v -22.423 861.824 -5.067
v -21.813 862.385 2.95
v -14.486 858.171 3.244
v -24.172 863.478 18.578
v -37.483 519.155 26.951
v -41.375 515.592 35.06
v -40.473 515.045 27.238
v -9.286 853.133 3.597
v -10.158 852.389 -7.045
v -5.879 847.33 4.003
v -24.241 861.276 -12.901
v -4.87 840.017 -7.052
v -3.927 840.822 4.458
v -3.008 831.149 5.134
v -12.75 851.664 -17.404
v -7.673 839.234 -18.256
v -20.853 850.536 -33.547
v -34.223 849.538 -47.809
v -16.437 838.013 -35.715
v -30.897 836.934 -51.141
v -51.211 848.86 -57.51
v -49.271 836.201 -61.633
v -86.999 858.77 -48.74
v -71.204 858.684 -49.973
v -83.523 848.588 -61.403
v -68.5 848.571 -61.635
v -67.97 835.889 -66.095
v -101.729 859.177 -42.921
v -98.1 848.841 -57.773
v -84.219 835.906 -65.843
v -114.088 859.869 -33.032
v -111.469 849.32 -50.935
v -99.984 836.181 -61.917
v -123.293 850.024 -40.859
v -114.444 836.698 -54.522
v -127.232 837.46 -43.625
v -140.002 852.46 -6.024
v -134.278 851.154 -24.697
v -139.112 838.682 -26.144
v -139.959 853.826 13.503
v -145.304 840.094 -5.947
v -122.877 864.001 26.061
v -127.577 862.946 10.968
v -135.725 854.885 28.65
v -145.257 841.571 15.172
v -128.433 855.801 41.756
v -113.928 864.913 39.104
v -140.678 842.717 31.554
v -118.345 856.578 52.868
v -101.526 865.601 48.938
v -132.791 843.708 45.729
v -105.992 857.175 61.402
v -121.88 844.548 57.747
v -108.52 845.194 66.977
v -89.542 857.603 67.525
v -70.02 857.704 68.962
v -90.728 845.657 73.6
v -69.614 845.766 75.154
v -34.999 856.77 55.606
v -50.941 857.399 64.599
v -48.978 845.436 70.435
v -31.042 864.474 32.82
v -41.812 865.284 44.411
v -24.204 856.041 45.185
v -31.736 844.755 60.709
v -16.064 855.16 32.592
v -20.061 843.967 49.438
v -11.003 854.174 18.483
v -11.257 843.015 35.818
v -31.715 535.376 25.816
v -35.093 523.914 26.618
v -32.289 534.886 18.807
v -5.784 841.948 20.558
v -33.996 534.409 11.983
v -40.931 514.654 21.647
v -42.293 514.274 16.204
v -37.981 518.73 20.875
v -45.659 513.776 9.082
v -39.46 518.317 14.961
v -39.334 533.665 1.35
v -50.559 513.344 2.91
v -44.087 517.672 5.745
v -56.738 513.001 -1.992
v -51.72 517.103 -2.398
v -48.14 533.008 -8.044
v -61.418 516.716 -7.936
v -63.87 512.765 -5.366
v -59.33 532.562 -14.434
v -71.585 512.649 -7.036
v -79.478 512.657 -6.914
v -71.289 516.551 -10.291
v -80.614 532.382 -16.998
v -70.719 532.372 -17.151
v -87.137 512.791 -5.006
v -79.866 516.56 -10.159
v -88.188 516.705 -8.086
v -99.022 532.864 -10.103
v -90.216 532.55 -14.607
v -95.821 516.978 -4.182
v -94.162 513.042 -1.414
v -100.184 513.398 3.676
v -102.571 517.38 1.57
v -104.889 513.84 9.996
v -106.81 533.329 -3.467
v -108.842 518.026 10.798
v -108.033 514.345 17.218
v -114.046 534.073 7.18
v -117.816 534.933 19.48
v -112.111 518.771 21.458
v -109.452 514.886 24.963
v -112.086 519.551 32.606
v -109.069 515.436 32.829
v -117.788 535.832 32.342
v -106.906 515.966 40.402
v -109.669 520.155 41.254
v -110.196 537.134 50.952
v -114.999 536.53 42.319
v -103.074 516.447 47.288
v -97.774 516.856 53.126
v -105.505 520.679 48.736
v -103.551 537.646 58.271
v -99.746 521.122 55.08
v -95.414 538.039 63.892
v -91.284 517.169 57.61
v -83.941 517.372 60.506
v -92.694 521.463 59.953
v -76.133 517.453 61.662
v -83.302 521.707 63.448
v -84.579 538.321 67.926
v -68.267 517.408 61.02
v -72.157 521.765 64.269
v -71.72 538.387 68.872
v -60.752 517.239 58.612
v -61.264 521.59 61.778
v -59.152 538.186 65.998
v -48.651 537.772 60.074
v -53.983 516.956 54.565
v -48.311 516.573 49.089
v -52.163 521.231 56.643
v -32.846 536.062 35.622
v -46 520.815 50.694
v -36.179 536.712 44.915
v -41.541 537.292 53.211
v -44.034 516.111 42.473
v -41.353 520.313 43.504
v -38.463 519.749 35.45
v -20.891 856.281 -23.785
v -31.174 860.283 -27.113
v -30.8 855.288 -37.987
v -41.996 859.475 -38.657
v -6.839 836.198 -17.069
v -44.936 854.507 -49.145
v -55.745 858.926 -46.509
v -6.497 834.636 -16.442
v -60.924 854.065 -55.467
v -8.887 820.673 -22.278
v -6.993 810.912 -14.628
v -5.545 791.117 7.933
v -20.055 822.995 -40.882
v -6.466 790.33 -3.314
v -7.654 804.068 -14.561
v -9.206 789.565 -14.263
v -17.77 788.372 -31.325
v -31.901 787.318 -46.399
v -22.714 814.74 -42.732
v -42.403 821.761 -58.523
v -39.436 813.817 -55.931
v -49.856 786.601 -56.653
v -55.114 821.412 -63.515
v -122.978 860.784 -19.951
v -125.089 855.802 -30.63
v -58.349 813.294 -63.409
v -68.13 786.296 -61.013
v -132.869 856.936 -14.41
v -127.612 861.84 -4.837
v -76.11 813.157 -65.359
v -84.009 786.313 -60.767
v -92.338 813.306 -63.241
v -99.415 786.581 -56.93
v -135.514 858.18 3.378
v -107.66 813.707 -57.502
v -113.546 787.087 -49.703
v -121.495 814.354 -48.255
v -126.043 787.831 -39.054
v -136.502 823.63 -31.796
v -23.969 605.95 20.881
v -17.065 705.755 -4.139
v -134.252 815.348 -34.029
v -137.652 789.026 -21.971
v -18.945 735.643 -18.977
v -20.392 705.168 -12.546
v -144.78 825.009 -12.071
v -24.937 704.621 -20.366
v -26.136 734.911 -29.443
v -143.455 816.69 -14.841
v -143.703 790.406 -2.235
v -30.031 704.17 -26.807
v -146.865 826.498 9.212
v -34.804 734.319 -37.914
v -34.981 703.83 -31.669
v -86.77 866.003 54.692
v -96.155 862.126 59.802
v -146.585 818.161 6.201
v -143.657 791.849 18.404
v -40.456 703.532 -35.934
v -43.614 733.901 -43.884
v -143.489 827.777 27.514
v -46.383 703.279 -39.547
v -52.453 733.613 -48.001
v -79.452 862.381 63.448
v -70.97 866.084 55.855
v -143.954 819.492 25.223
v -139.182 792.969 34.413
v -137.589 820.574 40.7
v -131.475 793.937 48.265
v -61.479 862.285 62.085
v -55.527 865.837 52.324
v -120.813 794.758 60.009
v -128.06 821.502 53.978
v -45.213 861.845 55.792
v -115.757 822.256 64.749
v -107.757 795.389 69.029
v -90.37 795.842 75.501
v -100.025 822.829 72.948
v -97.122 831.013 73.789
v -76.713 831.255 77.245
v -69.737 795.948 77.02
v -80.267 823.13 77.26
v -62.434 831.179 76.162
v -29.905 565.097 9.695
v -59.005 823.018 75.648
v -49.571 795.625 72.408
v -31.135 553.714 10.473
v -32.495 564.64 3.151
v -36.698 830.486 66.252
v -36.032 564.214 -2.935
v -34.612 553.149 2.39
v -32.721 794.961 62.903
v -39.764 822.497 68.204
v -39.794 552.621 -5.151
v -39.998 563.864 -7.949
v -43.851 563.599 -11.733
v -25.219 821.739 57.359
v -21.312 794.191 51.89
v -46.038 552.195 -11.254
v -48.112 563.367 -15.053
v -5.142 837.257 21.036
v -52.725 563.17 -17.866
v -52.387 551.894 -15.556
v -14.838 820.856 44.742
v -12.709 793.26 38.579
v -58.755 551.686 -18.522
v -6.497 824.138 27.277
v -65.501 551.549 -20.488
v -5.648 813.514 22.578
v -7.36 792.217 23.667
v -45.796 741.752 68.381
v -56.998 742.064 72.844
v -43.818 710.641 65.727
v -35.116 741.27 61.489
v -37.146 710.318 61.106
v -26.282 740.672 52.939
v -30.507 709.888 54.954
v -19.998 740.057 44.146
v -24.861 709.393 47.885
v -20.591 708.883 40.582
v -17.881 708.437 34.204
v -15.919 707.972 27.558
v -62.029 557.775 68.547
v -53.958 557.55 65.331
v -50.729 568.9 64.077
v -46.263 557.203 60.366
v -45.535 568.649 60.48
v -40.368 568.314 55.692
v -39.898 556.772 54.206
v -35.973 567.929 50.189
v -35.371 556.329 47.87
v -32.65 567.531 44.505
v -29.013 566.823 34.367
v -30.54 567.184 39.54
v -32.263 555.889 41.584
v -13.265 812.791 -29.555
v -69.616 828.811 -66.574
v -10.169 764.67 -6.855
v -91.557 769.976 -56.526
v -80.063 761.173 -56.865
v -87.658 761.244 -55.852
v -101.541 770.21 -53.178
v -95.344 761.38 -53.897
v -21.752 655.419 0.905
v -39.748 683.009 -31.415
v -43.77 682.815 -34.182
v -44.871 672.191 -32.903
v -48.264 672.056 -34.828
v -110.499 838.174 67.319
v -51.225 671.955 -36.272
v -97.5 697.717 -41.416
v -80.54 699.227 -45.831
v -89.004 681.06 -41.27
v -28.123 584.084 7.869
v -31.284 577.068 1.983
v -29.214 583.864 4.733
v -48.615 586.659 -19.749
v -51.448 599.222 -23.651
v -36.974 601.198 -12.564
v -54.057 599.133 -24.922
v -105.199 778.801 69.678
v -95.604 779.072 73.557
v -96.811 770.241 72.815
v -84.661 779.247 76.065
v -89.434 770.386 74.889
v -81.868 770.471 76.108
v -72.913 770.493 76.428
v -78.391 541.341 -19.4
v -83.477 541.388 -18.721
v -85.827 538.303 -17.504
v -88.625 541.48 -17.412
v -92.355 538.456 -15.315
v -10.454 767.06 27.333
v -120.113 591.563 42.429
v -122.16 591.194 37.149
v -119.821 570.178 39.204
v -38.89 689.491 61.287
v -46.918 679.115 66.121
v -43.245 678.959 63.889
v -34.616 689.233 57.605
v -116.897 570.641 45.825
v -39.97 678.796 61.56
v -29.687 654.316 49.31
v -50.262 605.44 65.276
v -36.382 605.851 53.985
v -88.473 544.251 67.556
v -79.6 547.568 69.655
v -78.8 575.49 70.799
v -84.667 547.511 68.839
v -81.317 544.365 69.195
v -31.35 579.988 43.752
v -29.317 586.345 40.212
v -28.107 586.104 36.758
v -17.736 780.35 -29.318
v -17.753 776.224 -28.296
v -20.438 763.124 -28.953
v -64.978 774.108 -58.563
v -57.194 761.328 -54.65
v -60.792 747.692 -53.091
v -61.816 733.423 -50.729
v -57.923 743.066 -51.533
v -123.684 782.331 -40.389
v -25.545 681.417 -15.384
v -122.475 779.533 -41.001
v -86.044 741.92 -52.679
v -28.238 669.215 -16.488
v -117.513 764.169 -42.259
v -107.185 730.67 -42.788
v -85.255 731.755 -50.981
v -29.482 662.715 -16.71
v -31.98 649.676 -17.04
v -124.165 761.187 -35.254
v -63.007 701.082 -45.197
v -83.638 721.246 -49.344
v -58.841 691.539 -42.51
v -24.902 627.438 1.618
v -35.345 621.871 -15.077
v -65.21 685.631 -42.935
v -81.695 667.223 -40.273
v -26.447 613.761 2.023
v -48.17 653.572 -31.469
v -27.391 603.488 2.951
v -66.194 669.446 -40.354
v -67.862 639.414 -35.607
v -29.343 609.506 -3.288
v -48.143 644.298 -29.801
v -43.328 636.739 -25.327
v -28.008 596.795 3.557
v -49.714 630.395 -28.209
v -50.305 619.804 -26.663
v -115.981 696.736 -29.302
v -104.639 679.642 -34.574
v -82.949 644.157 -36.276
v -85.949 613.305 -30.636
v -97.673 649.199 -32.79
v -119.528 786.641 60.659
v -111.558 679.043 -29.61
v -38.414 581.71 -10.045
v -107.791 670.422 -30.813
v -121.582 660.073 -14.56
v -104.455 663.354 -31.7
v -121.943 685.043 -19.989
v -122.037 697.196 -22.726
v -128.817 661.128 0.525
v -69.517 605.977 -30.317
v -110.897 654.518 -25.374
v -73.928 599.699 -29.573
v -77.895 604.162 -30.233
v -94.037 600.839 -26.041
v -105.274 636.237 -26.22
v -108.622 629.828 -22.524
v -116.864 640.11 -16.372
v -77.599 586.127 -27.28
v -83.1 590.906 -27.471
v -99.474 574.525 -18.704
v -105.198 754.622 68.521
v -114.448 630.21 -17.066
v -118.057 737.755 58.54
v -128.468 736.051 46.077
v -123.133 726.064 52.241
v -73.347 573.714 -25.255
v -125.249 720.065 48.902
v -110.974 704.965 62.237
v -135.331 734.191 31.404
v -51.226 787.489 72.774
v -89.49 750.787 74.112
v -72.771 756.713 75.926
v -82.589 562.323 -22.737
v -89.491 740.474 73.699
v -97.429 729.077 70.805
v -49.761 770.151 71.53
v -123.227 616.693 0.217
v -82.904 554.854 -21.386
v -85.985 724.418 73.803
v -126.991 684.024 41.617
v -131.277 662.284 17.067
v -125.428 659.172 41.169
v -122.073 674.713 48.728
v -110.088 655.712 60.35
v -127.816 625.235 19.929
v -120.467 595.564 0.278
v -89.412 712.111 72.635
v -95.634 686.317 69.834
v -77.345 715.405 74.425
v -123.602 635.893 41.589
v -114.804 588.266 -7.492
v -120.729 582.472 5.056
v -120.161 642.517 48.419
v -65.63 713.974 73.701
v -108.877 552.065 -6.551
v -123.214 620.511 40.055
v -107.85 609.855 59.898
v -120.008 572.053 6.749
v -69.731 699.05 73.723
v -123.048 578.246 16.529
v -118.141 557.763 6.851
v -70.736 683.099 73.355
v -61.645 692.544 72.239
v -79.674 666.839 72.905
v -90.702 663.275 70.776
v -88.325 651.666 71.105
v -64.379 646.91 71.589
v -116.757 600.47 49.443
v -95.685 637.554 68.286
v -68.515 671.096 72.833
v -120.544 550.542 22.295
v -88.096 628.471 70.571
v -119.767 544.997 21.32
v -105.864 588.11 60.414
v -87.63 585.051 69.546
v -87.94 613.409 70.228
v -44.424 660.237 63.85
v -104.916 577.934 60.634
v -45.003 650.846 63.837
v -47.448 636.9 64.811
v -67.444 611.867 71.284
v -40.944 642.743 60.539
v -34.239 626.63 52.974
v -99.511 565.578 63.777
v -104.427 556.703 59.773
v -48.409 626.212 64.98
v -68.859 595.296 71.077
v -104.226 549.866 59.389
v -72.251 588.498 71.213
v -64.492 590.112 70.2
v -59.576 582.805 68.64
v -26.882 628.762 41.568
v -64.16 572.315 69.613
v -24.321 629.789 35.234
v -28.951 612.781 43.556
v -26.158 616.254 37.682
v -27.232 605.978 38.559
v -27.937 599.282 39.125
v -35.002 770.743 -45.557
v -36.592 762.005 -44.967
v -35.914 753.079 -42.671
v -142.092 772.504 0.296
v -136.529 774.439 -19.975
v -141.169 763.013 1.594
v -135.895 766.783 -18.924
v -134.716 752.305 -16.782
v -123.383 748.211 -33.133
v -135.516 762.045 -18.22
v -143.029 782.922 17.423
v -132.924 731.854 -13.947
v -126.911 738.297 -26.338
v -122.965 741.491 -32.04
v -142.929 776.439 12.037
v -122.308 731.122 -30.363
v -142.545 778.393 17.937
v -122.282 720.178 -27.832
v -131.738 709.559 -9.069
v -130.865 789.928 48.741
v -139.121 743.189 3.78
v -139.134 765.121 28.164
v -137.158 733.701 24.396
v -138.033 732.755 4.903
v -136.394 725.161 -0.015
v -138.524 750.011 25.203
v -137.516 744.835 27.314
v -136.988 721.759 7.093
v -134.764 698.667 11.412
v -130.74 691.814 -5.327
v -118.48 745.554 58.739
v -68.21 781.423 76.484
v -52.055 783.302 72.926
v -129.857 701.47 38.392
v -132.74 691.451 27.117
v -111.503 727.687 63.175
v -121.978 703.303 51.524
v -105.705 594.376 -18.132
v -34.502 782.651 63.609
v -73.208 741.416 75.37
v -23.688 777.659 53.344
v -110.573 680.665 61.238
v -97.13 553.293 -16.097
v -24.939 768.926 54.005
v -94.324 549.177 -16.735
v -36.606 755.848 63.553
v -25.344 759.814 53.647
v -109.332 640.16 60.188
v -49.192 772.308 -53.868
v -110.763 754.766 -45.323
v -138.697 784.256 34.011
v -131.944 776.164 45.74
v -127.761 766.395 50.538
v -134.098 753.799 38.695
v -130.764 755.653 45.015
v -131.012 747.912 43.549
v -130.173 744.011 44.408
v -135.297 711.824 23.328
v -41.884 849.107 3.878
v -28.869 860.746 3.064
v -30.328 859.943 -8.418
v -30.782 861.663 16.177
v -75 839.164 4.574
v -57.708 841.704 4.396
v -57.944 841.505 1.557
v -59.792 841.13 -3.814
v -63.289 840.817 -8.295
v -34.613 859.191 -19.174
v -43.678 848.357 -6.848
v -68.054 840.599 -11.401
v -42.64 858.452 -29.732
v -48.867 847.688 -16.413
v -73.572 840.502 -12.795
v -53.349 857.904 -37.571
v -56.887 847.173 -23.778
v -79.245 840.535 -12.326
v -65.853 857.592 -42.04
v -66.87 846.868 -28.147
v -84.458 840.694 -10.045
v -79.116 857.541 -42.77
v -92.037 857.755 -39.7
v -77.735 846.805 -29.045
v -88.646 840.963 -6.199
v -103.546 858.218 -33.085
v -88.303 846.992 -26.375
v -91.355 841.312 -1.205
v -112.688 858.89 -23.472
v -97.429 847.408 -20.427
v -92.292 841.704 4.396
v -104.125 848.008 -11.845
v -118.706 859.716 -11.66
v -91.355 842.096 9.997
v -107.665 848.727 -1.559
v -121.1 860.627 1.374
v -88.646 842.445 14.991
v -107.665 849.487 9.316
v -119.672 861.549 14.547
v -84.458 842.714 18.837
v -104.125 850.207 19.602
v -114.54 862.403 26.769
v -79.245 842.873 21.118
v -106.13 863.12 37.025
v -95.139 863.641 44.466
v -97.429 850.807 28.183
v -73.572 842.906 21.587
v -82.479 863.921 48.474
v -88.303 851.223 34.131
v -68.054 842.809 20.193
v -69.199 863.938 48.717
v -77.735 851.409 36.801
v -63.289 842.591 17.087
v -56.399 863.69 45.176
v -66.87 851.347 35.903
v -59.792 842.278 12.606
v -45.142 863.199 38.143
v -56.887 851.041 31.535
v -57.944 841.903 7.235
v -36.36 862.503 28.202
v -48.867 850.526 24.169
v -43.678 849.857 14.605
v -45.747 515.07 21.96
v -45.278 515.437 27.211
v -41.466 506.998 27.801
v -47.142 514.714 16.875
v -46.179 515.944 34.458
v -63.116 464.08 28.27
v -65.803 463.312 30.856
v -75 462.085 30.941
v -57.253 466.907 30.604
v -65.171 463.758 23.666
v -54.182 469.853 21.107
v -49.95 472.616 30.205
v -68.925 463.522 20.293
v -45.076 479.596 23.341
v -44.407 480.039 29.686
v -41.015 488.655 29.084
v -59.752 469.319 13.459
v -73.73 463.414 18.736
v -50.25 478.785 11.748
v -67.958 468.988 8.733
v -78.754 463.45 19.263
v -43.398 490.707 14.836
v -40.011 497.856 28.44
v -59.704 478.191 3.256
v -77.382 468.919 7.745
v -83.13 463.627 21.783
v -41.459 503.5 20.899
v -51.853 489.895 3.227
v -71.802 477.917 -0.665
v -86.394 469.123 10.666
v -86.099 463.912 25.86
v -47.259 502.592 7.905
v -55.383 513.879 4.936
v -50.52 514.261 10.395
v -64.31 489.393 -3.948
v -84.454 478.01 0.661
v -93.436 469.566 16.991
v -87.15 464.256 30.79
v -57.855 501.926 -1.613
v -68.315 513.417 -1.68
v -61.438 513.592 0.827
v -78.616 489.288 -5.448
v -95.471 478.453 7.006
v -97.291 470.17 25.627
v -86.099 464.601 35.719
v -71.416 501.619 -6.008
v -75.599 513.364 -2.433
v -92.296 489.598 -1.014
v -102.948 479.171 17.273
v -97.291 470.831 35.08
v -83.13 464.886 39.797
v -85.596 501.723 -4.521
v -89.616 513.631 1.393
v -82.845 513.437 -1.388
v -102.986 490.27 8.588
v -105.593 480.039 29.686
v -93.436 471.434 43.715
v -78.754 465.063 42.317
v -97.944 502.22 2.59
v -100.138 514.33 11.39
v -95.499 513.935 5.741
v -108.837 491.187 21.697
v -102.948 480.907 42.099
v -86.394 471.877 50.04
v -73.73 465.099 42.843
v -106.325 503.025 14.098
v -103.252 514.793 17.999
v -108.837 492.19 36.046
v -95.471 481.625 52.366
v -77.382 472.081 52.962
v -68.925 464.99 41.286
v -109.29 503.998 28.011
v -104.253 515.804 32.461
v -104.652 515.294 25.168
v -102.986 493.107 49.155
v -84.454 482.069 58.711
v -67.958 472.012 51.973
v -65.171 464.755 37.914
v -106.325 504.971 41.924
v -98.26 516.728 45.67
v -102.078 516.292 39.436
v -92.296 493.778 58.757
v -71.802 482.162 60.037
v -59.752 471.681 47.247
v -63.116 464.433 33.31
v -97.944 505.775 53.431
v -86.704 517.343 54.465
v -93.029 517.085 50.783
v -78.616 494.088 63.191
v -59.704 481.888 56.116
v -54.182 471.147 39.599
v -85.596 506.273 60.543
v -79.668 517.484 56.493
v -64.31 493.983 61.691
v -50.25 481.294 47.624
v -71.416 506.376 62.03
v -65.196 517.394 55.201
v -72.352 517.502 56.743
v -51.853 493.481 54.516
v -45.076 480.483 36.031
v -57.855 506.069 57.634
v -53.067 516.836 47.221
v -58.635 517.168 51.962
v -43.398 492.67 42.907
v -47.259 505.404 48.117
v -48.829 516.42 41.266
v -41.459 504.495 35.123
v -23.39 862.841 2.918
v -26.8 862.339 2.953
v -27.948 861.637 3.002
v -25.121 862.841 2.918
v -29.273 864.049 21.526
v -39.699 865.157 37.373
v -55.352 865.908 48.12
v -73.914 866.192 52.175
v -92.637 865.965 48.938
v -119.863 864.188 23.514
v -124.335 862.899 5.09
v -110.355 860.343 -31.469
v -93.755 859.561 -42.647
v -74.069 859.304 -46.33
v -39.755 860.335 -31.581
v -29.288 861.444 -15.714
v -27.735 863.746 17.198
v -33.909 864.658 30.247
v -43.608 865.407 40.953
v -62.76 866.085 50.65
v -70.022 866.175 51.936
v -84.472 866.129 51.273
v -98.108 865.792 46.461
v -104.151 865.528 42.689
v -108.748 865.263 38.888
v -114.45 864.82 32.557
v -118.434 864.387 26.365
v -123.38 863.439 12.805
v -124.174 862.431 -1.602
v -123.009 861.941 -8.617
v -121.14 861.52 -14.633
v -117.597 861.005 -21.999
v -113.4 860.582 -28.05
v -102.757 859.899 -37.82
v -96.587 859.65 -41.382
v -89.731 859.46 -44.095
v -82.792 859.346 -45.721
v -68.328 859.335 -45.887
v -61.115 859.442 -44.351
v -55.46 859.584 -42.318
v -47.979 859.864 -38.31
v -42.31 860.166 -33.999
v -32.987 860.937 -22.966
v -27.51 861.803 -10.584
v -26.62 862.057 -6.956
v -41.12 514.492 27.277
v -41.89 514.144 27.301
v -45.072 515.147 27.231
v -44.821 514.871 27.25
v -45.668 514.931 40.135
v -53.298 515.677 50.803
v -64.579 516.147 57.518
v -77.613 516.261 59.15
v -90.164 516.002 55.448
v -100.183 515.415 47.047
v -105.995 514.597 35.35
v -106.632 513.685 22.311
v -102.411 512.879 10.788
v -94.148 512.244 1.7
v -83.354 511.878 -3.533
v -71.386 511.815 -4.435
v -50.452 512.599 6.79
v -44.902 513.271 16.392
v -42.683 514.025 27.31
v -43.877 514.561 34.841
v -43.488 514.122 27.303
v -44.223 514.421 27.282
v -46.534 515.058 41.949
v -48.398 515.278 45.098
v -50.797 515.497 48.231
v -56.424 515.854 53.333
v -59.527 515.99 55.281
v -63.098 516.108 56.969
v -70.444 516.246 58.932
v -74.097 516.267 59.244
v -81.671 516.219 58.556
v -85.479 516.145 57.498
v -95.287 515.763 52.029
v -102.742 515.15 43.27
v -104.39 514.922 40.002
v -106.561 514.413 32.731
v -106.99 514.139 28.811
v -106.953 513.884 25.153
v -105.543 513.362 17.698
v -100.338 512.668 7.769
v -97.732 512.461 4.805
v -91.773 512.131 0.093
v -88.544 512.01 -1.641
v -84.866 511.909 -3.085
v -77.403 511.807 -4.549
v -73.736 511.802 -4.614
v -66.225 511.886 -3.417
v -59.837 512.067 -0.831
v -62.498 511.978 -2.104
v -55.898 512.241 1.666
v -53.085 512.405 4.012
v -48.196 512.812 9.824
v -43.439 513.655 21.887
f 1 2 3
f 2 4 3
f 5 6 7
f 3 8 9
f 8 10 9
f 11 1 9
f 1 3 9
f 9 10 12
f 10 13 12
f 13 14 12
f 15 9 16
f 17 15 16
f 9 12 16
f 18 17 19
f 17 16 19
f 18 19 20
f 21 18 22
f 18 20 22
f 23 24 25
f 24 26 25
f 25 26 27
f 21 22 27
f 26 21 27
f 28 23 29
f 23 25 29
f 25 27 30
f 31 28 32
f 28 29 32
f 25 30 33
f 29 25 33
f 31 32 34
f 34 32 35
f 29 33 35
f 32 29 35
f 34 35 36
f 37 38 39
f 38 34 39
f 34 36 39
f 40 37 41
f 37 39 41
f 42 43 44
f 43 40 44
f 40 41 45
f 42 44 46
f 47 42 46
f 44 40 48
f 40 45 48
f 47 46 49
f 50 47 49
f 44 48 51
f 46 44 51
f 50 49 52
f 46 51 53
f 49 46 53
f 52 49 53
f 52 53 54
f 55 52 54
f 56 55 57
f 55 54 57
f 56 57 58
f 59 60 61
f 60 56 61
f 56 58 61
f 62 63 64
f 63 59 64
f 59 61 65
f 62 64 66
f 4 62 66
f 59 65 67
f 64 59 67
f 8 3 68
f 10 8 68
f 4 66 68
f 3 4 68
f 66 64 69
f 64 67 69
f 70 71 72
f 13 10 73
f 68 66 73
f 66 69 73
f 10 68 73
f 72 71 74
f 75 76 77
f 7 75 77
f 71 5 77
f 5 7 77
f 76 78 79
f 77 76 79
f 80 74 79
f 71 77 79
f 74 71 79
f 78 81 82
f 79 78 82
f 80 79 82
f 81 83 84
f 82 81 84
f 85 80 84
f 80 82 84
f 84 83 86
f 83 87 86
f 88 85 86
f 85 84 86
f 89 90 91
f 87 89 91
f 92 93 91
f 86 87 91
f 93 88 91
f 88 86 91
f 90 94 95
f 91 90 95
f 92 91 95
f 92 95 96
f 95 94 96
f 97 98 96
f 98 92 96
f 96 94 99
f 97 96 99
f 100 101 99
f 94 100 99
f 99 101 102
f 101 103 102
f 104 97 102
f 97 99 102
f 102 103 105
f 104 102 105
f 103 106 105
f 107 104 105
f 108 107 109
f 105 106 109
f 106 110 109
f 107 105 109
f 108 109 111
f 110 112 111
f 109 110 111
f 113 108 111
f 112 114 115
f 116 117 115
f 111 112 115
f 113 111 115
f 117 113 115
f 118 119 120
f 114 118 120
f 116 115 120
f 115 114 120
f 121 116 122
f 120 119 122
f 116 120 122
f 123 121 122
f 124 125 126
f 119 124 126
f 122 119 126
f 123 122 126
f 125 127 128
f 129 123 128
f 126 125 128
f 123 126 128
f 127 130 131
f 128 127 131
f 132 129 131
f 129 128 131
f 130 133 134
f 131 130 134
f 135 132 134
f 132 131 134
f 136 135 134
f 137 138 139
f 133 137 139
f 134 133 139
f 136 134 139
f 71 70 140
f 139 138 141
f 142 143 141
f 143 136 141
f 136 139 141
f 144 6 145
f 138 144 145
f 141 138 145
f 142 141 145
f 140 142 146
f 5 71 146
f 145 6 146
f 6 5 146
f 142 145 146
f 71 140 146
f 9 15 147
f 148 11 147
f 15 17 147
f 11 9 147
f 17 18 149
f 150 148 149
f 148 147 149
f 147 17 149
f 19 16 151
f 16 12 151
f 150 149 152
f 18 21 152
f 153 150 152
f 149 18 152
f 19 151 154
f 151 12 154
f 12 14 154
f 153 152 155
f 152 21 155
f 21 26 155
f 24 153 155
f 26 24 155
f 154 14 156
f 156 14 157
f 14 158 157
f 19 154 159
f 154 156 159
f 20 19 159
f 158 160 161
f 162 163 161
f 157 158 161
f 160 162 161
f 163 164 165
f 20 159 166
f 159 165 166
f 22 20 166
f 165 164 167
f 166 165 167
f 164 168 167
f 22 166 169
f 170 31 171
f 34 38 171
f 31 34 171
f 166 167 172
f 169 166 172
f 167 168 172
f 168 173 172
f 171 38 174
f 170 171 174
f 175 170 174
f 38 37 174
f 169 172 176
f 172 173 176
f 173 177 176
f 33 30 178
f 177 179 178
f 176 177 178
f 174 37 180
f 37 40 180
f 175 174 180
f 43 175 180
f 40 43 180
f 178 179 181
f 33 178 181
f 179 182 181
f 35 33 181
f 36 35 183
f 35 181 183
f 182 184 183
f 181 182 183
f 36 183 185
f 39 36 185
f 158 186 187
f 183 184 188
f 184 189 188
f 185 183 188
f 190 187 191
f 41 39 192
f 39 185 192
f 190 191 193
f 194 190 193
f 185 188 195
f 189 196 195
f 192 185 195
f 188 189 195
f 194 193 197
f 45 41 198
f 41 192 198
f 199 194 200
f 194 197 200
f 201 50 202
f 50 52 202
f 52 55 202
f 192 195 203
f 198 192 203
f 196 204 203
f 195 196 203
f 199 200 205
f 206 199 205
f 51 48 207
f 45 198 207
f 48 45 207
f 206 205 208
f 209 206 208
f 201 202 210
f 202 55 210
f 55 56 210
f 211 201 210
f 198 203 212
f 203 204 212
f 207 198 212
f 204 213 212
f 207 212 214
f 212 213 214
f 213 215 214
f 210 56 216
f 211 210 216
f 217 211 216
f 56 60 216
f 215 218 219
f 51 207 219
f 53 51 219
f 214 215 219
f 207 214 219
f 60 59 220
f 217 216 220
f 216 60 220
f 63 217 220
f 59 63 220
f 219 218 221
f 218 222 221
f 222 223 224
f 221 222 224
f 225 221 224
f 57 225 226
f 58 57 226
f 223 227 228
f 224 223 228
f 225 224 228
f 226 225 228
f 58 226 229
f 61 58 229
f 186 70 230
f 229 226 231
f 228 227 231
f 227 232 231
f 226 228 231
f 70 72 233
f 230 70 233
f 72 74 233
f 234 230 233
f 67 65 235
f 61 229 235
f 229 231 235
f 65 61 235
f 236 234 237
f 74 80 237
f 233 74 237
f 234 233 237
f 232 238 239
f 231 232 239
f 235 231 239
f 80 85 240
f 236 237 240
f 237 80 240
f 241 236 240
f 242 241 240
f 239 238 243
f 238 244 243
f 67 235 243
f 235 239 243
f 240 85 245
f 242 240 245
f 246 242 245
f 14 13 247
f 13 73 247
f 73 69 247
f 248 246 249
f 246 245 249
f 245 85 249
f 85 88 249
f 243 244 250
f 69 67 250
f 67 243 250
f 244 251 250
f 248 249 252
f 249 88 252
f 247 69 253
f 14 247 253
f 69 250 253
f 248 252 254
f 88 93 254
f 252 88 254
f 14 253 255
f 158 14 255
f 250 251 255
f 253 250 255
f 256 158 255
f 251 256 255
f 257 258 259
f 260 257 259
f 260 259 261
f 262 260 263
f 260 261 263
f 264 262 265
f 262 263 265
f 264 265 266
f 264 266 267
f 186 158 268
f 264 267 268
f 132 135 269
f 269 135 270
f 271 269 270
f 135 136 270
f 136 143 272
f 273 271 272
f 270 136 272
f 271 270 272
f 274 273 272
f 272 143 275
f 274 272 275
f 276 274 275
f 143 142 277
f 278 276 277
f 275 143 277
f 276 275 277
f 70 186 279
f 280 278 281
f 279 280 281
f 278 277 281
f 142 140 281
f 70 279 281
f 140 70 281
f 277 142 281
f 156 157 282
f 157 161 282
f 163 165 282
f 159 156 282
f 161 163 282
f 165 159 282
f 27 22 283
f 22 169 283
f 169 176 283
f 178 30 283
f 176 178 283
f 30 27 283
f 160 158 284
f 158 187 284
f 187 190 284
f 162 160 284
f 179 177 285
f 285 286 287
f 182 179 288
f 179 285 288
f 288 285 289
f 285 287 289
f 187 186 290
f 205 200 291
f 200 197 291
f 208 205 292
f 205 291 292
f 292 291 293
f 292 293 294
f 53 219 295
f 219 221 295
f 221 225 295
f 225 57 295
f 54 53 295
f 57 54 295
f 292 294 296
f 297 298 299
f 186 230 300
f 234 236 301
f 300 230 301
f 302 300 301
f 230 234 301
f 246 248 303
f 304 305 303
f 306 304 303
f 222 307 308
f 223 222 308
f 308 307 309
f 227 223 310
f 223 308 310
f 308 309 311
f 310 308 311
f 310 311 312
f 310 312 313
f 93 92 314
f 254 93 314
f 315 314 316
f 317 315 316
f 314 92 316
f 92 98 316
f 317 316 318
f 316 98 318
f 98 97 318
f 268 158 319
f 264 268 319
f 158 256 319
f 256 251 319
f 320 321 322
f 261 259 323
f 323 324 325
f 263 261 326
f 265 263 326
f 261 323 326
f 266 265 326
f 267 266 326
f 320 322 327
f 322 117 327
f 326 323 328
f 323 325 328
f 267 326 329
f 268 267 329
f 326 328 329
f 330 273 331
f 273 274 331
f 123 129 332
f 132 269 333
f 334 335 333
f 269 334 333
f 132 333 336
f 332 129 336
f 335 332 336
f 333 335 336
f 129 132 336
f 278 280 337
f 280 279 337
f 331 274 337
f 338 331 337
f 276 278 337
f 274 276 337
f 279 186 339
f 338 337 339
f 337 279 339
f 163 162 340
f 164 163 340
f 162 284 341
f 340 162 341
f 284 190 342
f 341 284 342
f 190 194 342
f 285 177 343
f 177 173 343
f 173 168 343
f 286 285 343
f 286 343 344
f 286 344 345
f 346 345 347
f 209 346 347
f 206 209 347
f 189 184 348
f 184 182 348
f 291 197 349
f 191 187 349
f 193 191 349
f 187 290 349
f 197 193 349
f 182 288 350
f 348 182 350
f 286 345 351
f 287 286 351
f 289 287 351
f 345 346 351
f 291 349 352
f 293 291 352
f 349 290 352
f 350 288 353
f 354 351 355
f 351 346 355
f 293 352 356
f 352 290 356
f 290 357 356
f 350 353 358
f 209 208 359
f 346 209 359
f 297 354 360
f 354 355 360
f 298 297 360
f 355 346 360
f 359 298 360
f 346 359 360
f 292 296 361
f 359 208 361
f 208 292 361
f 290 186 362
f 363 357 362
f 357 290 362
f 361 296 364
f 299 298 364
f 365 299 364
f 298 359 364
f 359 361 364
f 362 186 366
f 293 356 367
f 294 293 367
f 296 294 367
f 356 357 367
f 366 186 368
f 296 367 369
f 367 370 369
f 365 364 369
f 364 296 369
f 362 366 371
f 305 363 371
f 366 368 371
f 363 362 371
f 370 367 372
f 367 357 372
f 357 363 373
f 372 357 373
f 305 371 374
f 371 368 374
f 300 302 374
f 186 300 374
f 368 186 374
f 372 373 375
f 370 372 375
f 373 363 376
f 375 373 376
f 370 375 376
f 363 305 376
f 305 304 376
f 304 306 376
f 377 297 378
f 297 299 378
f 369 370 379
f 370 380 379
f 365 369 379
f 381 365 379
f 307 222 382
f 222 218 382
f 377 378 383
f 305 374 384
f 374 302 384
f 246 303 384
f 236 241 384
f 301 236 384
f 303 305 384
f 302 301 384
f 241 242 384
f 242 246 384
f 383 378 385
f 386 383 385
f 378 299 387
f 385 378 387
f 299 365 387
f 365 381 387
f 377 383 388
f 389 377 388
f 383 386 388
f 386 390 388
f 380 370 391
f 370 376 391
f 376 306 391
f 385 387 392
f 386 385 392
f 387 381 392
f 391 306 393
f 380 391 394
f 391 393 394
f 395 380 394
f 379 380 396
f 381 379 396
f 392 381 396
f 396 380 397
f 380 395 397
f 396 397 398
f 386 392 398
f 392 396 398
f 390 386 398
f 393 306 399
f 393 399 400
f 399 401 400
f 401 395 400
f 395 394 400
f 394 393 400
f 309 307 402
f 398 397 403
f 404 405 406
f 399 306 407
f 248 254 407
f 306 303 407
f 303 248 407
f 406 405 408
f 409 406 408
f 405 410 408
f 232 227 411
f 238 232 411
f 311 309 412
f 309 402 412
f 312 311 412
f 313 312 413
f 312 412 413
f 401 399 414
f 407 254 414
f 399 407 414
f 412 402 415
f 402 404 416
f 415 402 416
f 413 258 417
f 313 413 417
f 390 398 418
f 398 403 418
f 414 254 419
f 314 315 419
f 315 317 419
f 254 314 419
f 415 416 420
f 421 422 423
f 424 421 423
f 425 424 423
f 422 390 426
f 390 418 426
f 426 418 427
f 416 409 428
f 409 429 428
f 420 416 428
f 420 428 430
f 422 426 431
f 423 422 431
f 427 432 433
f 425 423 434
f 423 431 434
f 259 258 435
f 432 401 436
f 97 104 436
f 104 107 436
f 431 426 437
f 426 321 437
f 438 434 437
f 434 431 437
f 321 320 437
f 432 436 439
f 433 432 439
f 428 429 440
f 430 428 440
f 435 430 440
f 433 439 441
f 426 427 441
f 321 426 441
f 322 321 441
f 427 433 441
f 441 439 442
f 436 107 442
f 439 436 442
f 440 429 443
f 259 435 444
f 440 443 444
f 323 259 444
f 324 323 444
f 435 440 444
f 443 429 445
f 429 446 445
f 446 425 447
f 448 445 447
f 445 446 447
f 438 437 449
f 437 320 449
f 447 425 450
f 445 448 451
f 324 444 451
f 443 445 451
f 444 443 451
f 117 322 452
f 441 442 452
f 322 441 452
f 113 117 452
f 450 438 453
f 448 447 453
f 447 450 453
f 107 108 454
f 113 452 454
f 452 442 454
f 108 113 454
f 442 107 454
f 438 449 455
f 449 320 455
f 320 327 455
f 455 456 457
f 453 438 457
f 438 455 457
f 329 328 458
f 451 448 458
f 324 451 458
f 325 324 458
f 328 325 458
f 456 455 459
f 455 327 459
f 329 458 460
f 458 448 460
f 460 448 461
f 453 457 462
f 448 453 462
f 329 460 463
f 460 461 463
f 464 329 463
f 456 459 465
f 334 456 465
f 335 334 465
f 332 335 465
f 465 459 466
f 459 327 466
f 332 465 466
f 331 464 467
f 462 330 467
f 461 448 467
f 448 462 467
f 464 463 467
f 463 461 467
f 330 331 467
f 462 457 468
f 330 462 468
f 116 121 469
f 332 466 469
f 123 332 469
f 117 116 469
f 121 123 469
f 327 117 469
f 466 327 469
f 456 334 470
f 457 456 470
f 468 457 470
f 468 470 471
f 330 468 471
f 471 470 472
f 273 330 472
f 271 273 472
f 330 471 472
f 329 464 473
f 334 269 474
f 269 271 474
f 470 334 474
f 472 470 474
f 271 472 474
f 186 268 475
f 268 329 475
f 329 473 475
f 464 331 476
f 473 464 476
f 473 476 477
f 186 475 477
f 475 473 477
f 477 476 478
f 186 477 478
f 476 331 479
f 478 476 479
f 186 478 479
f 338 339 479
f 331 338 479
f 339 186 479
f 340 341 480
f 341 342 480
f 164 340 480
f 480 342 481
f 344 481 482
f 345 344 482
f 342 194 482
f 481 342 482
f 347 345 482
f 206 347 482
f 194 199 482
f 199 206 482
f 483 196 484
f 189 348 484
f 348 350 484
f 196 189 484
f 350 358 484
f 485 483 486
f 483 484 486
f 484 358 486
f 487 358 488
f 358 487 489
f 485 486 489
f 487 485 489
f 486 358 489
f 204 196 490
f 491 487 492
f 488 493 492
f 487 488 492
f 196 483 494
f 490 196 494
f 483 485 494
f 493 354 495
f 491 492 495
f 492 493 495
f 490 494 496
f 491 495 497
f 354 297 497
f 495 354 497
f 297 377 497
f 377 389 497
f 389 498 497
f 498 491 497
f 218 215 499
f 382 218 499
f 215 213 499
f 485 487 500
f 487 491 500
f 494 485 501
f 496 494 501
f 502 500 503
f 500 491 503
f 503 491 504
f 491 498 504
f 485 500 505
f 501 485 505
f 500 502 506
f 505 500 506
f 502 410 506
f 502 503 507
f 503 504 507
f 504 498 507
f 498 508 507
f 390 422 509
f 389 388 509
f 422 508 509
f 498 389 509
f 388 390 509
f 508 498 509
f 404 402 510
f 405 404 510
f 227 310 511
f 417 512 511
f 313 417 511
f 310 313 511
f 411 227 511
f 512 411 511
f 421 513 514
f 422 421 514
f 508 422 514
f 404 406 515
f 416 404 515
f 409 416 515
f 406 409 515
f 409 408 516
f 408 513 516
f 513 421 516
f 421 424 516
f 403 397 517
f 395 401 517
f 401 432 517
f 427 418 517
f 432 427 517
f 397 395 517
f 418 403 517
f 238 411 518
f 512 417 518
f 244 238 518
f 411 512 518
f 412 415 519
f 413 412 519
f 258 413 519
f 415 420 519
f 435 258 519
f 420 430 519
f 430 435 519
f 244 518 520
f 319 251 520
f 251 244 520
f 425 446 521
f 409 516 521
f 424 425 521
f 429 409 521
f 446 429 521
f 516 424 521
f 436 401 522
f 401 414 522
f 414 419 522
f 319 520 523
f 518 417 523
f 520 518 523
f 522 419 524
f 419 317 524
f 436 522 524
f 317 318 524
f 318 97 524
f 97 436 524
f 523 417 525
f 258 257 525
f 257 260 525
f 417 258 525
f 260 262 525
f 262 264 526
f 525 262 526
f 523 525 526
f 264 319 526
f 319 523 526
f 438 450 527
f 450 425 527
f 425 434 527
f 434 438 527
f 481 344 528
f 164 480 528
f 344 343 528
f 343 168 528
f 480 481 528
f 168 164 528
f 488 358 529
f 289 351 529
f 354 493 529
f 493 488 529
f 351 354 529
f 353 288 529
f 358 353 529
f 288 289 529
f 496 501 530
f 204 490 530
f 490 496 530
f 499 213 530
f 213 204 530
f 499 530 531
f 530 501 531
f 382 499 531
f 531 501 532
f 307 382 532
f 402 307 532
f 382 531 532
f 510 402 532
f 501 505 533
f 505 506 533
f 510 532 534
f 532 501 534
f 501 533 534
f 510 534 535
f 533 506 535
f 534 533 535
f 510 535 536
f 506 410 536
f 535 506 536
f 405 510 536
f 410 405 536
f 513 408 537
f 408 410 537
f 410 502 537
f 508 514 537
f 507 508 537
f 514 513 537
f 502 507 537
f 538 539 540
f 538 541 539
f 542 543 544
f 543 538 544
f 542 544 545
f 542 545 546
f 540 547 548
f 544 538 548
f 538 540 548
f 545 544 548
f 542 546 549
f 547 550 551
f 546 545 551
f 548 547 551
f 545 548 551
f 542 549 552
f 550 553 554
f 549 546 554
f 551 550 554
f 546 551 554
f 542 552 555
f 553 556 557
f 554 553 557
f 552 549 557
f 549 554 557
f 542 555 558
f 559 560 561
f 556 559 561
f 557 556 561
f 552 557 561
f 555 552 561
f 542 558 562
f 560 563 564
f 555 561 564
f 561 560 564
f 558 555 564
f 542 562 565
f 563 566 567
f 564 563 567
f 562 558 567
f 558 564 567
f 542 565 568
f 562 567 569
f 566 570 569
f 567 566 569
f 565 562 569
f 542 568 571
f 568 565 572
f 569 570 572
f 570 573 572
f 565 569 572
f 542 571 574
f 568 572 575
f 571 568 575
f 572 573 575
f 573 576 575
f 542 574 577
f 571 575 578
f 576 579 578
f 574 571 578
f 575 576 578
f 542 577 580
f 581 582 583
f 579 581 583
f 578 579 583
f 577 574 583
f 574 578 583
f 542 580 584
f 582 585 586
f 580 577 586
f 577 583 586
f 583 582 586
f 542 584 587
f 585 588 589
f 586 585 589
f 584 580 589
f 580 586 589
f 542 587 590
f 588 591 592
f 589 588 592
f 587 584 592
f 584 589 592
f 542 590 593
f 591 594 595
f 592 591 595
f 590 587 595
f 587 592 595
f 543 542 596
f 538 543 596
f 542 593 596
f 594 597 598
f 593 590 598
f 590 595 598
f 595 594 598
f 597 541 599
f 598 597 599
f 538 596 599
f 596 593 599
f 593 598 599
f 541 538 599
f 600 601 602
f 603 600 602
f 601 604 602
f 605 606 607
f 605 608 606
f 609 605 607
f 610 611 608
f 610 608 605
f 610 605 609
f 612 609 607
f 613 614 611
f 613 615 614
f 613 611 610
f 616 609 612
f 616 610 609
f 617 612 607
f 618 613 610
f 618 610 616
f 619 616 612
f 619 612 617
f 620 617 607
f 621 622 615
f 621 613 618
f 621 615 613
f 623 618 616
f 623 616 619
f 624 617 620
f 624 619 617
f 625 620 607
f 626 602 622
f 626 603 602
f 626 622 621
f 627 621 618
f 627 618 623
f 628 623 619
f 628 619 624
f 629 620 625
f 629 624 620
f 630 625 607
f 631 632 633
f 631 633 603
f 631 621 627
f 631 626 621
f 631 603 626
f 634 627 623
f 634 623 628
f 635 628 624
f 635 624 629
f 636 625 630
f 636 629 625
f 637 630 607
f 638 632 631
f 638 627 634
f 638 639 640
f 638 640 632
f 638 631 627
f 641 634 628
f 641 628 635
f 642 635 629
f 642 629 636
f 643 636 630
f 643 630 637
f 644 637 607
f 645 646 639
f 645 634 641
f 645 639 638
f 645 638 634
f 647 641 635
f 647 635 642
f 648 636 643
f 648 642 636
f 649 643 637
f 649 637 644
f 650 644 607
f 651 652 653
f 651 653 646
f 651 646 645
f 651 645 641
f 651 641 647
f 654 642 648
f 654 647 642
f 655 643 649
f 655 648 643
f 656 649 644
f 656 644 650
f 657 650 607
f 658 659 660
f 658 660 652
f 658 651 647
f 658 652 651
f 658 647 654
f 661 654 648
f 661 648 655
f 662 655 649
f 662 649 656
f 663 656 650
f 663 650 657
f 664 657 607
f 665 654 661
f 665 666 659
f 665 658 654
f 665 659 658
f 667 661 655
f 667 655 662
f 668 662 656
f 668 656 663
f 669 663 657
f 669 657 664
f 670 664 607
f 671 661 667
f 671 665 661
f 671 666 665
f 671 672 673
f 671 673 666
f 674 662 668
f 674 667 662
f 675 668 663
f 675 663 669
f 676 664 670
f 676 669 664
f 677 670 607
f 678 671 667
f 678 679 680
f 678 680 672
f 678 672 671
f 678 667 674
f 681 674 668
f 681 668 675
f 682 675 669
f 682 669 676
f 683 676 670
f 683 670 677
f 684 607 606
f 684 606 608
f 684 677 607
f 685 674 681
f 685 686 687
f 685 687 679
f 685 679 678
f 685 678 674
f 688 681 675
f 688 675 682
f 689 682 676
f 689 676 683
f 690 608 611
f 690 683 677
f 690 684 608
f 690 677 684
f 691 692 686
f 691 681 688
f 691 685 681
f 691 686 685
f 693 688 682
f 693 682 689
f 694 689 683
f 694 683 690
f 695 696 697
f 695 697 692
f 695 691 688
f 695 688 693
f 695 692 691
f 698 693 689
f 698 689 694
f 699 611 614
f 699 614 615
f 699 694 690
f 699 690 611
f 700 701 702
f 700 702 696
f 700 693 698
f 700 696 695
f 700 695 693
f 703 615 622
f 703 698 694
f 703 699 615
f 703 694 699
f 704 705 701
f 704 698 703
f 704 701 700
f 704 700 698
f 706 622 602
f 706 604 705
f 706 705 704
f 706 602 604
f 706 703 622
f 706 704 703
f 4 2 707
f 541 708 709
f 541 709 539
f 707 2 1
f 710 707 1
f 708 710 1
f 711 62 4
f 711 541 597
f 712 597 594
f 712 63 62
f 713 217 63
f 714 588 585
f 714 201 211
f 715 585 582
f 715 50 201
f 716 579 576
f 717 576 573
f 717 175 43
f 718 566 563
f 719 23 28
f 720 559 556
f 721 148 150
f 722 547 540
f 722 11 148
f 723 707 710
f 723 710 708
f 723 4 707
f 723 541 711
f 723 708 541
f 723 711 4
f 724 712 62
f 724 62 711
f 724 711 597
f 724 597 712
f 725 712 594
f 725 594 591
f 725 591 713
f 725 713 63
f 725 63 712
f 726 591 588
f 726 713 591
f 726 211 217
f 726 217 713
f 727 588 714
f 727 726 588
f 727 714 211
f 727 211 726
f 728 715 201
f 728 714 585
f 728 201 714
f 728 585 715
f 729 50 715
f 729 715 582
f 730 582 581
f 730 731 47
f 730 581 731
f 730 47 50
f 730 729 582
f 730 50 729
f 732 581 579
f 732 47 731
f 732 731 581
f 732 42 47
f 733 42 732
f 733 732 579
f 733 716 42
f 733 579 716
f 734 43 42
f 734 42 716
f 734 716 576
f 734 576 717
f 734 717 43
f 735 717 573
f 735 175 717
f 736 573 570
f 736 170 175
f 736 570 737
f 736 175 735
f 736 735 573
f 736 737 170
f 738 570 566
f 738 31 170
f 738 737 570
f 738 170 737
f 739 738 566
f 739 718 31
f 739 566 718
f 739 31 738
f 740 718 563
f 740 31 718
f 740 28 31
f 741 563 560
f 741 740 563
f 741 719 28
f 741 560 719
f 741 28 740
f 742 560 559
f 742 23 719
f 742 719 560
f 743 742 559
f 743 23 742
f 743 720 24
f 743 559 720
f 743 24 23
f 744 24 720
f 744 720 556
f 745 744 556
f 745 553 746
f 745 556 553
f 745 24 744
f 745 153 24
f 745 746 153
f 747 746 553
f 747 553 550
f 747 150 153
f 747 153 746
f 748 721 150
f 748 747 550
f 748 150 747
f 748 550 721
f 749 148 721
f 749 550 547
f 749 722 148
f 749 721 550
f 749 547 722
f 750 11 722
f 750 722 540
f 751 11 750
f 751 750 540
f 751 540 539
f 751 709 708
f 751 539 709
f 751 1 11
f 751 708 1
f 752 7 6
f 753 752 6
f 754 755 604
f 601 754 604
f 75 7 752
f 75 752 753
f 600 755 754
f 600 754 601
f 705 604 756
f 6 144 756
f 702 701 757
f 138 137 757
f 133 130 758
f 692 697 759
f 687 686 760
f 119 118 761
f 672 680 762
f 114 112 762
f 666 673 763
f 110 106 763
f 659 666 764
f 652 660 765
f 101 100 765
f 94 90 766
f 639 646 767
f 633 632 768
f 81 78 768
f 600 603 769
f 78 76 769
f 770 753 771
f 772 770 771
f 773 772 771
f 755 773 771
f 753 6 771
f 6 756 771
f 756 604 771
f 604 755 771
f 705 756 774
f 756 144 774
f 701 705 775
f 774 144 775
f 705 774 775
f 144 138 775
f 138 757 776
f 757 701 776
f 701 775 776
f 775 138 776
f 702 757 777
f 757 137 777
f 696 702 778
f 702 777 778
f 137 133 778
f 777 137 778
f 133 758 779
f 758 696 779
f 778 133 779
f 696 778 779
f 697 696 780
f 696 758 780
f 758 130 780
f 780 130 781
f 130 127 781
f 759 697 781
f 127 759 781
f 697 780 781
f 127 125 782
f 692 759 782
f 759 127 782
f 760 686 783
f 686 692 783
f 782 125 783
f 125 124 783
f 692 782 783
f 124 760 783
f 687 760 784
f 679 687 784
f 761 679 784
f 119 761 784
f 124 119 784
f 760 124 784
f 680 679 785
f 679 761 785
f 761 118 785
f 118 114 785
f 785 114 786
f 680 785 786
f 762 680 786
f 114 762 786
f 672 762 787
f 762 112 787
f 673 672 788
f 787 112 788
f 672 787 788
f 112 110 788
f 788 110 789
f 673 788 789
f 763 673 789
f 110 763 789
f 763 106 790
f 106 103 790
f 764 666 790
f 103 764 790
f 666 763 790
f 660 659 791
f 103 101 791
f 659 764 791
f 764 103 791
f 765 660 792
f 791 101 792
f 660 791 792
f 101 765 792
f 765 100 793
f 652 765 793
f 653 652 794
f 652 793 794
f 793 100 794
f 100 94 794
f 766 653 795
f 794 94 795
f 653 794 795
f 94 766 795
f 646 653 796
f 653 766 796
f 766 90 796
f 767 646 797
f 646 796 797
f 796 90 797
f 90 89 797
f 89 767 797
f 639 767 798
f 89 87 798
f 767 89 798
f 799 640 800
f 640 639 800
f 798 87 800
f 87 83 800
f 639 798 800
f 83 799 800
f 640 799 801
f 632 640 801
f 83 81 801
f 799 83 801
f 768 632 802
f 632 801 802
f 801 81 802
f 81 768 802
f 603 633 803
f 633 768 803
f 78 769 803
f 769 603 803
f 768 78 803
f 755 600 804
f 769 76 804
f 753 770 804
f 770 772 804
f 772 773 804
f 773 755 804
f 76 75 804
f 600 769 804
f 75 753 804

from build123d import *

# Parameters (mm, degrees)
FILLET075_R             = 6
FILLET076_R             = 3
BODY046_PLACEMENT_ANGLE = 4


with BuildPart() as part:
    # Sketch153 → Revolution079 (revolve)
    with BuildSketch(Plane.XY):
        with BuildLine():
            Line((0, -29.245996), (0, -395.969613))
            add(Edge.make_bspline(
                [(0, -29.245996), (71.97521, -29.245996), (74.761139, -71.14093), (60.18763, -188.319479), (45.659971, -358.12794), (39.993144, -395.969613), (0, -395.969613)],
                knots=[0, 0, 0, 0, 0.25, 0.5, 0.75, 1, 1, 1, 1], degree=3))
        make_face()
    revolve(axis=Axis((0, 0, 0), (0, 1, 0)))

    # Sketch154 → Groove073 (revolve, cut)
    with BuildSketch(Plane.XY):
        with BuildLine():
            Line((0, 60), (0, -60))
            ThreePointArc((0, -60), (60, 0), (0, 60))
        make_face()
    revolve(axis=Axis((0, 0, 0), (0, 1, 0)), mode=Mode.SUBTRACT)

    # Fillet075
    fillet075_edges = [part.edges().sort_by_distance(p)[0] for p in [
        (-48.746872, -34.982031, 0),
    ]]
    fillet(fillet075_edges, radius=FILLET075_R)

    # Sketch155 → Groove074 (revolve, cut)
    with BuildSketch(Plane.XY):
        with BuildLine():
            Line((0, -368), (0, -438))
            ThreePointArc((0, -438), (35, -403), (0, -368))
        make_face()
    revolve(axis=Axis((0, 0, 0), (0, 1, 0)), mode=Mode.SUBTRACT)

    # Fillet076
    fillet076_edges = [part.edges().sort_by_distance(p)[0] for p in [
        (-31.536984, -387.820454, 0),
    ]]
    fillet(fillet076_edges, radius=FILLET076_R)

    # Sketch155 → Revolution080 (revolve)
    with BuildSketch(Plane.XY):
        with BuildLine():
            Line((0, -368), (0, -438))
            ThreePointArc((0, -438), (35, -403), (0, -368))
        make_face()
    revolve(axis=Axis((0, 0, 0), (0, 1, 0)))


with BuildPart() as part_1:
    # Body046 placement: moved
    add(part.part.moved(Location((-75, 899.018312, 0.388141))).rotate(Axis((-75, 899.018312, 0.388141), (-1, 0, 0)), BODY046_PLACEMENT_ANGLE))


solid = part_1.part
